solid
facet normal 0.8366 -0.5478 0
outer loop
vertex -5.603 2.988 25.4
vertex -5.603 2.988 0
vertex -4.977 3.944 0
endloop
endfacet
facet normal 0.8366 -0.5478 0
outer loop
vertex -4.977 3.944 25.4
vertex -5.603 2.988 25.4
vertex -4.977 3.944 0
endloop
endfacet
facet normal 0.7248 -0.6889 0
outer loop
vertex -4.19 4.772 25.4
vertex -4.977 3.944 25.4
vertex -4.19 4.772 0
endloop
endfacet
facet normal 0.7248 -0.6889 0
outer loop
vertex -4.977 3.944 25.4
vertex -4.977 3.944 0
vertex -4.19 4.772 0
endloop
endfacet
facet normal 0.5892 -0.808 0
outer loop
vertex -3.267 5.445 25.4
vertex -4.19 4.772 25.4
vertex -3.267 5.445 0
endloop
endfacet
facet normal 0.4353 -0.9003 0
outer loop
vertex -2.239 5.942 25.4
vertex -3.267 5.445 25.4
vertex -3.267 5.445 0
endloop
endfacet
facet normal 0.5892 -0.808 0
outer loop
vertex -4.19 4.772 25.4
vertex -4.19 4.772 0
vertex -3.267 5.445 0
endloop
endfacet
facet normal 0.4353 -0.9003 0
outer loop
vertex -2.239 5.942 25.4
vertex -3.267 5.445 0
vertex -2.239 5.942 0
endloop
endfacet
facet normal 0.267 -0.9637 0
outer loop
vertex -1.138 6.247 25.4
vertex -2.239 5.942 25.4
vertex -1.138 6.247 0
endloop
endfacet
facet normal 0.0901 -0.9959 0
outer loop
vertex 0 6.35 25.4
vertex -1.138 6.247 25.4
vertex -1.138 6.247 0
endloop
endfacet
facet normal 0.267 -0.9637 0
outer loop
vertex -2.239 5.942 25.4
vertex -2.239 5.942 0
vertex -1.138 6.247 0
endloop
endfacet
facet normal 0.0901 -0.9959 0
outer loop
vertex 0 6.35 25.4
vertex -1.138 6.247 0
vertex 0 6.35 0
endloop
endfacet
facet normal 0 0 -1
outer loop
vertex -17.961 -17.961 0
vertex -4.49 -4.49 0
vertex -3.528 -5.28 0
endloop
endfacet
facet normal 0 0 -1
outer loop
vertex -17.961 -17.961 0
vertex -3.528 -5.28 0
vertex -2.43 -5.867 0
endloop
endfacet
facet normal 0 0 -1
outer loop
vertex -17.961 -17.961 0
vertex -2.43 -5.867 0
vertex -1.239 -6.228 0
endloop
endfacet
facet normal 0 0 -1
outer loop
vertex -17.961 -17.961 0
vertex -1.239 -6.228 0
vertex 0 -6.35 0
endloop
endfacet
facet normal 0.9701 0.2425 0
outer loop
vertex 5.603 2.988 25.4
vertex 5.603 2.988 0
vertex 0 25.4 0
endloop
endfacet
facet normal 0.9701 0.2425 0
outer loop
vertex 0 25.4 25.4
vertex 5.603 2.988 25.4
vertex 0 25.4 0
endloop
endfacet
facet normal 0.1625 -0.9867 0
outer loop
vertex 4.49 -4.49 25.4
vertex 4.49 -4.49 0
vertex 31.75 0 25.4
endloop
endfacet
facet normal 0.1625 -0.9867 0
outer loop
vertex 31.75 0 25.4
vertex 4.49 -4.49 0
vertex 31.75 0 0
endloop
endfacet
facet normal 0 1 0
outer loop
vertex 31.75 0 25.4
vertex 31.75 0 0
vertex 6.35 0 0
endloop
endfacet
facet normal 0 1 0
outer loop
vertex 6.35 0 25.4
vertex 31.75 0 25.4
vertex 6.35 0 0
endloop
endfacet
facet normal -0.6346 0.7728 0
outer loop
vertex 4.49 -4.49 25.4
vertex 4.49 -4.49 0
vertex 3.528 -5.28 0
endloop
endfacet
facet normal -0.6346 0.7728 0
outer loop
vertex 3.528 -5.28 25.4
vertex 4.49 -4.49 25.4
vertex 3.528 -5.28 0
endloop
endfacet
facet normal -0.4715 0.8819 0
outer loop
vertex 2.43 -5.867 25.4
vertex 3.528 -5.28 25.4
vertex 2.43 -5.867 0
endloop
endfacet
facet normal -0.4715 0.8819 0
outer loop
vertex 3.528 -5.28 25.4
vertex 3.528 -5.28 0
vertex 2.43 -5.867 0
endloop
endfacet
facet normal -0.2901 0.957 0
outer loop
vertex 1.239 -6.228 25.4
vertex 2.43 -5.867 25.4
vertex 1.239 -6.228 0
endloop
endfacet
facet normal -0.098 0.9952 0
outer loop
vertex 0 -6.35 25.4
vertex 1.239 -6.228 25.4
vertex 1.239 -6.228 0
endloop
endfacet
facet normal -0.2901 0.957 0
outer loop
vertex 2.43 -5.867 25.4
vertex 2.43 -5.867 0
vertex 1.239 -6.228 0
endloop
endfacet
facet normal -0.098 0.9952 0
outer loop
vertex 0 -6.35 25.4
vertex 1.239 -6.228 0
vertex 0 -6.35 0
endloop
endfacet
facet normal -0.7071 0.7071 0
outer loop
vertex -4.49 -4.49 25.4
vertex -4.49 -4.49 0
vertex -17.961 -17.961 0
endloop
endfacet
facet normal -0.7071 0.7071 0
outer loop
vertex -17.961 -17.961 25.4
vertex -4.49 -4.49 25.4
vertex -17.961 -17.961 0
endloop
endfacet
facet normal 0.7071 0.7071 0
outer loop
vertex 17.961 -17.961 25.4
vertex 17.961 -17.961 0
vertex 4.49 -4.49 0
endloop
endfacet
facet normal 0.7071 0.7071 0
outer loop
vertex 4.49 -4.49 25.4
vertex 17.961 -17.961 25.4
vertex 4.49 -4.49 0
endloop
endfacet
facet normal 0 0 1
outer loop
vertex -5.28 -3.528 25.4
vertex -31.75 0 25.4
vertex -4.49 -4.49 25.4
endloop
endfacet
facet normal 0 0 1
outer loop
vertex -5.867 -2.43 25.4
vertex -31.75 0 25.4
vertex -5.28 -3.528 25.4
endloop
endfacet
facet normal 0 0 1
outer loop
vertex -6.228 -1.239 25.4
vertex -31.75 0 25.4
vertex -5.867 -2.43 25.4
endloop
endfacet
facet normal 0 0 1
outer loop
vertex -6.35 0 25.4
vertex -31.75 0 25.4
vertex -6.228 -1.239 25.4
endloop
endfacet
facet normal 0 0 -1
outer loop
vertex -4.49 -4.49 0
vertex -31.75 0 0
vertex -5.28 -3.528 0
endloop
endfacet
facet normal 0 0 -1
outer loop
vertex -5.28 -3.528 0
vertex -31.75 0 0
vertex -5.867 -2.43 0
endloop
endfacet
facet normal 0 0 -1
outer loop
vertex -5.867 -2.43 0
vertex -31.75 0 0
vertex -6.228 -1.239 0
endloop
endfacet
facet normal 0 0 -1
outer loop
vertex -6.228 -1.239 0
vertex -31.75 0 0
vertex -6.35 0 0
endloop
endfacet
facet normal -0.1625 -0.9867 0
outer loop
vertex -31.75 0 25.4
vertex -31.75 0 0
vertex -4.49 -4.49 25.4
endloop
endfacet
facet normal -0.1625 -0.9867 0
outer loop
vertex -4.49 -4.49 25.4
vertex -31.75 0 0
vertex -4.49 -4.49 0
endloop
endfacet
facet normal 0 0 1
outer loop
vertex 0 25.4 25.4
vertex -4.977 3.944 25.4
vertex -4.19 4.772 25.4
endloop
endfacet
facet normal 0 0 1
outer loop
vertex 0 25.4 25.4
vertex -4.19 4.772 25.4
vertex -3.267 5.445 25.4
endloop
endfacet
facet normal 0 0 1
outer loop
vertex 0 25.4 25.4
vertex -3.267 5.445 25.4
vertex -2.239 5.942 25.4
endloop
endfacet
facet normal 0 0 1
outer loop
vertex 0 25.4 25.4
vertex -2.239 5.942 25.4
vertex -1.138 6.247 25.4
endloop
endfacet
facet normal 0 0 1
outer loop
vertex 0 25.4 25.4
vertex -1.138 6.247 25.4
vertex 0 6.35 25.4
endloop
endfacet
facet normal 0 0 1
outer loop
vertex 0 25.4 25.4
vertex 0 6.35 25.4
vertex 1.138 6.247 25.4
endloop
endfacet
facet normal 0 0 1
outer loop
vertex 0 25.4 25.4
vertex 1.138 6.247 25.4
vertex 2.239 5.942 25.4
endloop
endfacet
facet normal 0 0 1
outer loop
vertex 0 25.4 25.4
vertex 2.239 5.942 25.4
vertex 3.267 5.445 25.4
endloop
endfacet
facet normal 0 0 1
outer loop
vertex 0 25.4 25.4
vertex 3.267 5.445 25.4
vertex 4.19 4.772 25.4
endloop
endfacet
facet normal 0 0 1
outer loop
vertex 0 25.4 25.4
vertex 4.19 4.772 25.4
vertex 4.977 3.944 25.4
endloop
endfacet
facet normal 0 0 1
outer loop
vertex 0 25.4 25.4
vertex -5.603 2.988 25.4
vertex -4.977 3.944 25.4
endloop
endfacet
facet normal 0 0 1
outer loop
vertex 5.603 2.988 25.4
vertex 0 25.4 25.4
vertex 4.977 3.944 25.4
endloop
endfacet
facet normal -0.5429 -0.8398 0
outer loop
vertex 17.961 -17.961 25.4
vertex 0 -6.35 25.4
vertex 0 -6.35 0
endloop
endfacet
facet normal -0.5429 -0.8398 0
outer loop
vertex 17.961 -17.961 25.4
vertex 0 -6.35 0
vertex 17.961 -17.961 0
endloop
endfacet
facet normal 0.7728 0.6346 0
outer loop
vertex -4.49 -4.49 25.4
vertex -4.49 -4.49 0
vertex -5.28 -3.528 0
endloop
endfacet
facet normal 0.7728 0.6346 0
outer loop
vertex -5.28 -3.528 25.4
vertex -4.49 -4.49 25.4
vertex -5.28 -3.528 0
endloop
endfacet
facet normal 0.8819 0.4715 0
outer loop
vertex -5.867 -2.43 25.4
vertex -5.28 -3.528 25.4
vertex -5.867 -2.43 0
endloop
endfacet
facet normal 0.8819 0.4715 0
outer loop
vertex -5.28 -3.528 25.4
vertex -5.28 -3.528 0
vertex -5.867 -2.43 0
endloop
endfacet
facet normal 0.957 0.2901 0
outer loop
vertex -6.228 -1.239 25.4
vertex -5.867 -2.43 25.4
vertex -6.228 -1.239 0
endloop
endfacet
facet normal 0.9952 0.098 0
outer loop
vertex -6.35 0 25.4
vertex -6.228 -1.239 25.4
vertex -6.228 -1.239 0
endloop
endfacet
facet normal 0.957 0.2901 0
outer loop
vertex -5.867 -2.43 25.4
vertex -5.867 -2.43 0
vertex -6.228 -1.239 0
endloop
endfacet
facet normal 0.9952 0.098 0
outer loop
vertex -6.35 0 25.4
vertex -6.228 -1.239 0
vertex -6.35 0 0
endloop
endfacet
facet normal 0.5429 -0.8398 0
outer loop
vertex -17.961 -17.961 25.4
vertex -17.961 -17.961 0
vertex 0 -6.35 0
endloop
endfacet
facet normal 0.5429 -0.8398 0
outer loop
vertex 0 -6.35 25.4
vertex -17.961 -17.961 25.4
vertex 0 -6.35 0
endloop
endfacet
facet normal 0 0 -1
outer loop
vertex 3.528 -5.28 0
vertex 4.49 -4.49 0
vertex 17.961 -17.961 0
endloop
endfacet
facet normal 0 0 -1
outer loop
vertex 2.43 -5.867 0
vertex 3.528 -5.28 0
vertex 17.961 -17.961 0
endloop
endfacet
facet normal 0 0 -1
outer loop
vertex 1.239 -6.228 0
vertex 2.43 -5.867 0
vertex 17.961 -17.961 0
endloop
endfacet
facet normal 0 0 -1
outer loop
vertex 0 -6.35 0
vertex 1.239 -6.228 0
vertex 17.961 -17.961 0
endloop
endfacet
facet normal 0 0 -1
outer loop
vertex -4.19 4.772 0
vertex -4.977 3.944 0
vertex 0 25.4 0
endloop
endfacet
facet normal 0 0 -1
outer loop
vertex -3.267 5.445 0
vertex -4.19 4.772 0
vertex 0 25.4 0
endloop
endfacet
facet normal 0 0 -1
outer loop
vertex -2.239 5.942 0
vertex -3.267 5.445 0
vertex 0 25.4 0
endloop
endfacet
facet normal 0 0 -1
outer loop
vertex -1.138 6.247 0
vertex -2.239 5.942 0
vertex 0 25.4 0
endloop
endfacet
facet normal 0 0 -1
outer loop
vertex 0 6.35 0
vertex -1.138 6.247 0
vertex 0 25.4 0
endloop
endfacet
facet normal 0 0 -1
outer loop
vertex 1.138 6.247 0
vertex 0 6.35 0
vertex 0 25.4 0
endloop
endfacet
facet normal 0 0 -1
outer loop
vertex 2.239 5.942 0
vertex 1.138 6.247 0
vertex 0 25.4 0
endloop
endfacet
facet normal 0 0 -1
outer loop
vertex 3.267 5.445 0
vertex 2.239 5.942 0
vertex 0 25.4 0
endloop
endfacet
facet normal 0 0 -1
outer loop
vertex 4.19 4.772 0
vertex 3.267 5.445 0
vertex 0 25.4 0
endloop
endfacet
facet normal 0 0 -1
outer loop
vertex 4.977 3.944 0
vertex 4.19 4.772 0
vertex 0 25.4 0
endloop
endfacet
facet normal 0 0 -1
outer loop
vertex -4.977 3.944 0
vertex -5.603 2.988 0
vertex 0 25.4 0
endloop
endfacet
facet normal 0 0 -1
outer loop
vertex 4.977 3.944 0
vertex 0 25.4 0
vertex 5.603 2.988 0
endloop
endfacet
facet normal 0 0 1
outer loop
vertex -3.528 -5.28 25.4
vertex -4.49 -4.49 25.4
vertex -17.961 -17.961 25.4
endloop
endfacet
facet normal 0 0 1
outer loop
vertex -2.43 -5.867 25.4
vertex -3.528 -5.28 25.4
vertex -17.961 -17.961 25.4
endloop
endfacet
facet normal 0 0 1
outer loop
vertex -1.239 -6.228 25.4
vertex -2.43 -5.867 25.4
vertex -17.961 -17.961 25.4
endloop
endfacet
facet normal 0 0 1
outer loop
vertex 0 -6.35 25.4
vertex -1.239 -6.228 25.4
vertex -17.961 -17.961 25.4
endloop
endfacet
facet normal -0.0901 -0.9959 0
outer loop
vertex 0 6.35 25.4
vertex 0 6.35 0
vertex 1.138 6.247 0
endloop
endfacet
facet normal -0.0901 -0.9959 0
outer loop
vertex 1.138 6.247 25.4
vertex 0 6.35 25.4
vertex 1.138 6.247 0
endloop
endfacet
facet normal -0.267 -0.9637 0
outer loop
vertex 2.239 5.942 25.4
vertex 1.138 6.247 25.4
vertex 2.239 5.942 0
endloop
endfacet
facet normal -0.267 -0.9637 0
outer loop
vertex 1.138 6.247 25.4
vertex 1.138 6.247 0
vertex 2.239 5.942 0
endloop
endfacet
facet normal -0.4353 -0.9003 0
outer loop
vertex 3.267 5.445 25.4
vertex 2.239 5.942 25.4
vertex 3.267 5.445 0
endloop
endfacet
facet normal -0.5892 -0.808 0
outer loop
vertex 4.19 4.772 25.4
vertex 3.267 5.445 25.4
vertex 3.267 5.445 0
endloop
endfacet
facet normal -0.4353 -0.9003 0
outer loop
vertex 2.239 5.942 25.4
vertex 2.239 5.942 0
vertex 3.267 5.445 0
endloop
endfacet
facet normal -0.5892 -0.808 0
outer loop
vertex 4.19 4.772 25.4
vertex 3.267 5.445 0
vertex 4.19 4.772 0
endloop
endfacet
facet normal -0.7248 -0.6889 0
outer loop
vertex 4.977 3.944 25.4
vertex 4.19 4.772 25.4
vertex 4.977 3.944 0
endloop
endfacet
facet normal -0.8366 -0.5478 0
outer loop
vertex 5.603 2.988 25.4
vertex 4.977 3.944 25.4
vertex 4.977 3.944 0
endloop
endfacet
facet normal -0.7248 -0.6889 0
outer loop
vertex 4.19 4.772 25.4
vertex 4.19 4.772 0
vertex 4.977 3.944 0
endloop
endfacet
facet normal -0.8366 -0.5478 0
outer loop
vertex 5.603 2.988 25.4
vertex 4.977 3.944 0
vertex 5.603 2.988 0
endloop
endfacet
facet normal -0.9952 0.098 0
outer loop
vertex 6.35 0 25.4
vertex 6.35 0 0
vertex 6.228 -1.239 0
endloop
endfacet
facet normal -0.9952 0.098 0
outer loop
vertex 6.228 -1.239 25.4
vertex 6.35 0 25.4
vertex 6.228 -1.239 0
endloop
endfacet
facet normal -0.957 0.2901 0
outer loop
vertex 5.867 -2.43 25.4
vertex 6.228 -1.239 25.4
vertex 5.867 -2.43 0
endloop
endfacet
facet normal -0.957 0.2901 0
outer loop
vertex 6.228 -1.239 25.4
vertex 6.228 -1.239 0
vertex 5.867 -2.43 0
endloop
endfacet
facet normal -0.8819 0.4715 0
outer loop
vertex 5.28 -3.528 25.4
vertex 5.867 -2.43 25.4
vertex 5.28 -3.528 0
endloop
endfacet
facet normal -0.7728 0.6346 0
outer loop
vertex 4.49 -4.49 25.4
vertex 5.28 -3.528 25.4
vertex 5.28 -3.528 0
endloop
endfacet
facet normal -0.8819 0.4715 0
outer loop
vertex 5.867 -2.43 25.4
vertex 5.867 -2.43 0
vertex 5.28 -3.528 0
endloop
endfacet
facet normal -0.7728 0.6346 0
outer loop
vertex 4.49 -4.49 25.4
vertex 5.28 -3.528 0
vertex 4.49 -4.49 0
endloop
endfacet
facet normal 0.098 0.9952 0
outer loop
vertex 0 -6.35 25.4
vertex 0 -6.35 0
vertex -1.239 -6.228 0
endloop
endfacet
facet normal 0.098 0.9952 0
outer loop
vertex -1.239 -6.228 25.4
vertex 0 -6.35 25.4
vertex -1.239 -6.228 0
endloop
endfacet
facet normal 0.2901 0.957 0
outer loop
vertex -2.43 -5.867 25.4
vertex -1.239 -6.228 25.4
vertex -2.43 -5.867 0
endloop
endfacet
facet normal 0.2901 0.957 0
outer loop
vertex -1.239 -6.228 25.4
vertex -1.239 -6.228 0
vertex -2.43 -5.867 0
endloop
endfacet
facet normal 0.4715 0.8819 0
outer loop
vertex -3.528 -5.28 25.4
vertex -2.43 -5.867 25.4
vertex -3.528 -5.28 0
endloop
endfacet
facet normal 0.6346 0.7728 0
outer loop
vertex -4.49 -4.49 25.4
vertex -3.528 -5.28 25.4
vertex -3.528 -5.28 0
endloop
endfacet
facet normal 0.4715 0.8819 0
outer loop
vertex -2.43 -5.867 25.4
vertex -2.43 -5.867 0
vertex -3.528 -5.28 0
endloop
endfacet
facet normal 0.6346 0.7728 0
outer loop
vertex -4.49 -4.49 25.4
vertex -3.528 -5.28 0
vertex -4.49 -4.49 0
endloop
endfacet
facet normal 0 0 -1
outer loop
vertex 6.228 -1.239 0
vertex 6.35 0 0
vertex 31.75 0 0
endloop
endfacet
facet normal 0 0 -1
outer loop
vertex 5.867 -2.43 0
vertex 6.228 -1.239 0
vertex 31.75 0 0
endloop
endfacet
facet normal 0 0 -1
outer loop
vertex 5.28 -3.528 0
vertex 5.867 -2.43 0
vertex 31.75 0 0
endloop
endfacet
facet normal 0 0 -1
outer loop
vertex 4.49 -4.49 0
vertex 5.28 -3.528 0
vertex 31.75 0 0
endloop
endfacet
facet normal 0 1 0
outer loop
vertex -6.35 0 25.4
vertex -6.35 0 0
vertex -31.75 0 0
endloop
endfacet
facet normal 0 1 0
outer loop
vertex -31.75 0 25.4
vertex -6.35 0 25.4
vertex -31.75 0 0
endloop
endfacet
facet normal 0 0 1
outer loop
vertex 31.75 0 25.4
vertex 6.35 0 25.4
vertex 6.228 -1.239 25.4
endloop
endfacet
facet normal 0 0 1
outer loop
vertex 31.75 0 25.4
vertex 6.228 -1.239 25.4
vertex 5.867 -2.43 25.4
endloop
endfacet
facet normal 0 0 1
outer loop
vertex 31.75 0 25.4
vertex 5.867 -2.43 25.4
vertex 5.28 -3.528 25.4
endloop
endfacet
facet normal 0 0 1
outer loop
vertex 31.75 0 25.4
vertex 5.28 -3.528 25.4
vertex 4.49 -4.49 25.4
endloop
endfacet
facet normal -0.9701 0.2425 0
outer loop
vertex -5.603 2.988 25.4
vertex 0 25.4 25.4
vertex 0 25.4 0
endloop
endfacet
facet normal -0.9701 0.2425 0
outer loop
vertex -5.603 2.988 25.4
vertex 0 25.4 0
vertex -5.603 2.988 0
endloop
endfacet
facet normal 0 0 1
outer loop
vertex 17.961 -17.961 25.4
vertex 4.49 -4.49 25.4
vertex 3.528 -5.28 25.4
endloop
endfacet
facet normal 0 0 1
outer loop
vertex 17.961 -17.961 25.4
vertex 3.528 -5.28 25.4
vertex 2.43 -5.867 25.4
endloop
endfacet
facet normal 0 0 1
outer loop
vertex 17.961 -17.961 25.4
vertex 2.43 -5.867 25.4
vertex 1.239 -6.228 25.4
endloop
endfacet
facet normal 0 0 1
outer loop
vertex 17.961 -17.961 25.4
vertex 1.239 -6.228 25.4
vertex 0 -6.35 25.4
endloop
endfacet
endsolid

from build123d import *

# Parameters (mm, degrees)
F1_DEPTH = 25.4
F2_R     = 6.35
F3_DEPTH = 25.4


with BuildPart() as f1:
    # F0 (on Top) → F1 (new body)
    with BuildSketch(Plane.XY):
        with BuildLine():
            ThreePointArc((-4.490128, -4.490128), (-5.866635, -2.43004), (-6.35, 0))
            Line((-6.35, 0), (-31.75, 0))
            Line((-31.75, 0), (-4.490128, -4.490128))
        make_face()
        with BuildLine():
            ThreePointArc((-5.602941, 2.988235), (-6.160405, 1.540101), (-6.35, 0))
            Line((-6.35, 0), (-5.602941, 2.988235))
        make_face()
        with BuildLine():
            ThreePointArc((0, -6.35), (-2.43004, -5.866635), (-4.490128, -4.490128))
            Line((-4.490128, -4.490128), (-17.960512, -17.960512))
            Line((-17.960512, -17.960512), (0, -6.35))
        make_face()
        with BuildLine():
            Line((0, 25.4), (-5.602941, 2.988235))
            ThreePointArc((-5.602941, 2.988235), (-3.267048, 5.44508), (0, 6.35))
            Line((0, 6.35), (0, 25.4))
        make_face()
        with BuildLine():
            ThreePointArc((4.490128, -4.490128), (2.43004, -5.866635), (0, -6.35))
            Line((0, -6.35), (17.960512, -17.960512))
            Line((17.960512, -17.960512), (4.490128, -4.490128))
        make_face()
        with BuildLine():
            Line((0, 25.4), (0, 6.35))
            ThreePointArc((0, 6.35), (3.267048, 5.44508), (5.602941, 2.988235))
            Line((5.602941, 2.988235), (0, 25.4))
        make_face()
        with BuildLine():
            ThreePointArc((6.35, 0), (5.866635, -2.43004), (4.490128, -4.490128))
            Line((4.490128, -4.490128), (31.75, 0))
            Line((31.75, 0), (6.35, 0))
        make_face()
        with BuildLine():
            ThreePointArc((6.35, 0), (6.160405, 1.540101), (5.602941, 2.988235))
            Line((5.602941, 2.988235), (6.35, 0))
        make_face()
    extrude(amount=F1_DEPTH)

    # F2 (on face) → F3 (cut)
    with BuildSketch(Plane.XY.offset(25.4)):
        Circle(F2_R)
    extrude(amount=-F3_DEPTH, mode=Mode.SUBTRACT)


solid = f1.part
